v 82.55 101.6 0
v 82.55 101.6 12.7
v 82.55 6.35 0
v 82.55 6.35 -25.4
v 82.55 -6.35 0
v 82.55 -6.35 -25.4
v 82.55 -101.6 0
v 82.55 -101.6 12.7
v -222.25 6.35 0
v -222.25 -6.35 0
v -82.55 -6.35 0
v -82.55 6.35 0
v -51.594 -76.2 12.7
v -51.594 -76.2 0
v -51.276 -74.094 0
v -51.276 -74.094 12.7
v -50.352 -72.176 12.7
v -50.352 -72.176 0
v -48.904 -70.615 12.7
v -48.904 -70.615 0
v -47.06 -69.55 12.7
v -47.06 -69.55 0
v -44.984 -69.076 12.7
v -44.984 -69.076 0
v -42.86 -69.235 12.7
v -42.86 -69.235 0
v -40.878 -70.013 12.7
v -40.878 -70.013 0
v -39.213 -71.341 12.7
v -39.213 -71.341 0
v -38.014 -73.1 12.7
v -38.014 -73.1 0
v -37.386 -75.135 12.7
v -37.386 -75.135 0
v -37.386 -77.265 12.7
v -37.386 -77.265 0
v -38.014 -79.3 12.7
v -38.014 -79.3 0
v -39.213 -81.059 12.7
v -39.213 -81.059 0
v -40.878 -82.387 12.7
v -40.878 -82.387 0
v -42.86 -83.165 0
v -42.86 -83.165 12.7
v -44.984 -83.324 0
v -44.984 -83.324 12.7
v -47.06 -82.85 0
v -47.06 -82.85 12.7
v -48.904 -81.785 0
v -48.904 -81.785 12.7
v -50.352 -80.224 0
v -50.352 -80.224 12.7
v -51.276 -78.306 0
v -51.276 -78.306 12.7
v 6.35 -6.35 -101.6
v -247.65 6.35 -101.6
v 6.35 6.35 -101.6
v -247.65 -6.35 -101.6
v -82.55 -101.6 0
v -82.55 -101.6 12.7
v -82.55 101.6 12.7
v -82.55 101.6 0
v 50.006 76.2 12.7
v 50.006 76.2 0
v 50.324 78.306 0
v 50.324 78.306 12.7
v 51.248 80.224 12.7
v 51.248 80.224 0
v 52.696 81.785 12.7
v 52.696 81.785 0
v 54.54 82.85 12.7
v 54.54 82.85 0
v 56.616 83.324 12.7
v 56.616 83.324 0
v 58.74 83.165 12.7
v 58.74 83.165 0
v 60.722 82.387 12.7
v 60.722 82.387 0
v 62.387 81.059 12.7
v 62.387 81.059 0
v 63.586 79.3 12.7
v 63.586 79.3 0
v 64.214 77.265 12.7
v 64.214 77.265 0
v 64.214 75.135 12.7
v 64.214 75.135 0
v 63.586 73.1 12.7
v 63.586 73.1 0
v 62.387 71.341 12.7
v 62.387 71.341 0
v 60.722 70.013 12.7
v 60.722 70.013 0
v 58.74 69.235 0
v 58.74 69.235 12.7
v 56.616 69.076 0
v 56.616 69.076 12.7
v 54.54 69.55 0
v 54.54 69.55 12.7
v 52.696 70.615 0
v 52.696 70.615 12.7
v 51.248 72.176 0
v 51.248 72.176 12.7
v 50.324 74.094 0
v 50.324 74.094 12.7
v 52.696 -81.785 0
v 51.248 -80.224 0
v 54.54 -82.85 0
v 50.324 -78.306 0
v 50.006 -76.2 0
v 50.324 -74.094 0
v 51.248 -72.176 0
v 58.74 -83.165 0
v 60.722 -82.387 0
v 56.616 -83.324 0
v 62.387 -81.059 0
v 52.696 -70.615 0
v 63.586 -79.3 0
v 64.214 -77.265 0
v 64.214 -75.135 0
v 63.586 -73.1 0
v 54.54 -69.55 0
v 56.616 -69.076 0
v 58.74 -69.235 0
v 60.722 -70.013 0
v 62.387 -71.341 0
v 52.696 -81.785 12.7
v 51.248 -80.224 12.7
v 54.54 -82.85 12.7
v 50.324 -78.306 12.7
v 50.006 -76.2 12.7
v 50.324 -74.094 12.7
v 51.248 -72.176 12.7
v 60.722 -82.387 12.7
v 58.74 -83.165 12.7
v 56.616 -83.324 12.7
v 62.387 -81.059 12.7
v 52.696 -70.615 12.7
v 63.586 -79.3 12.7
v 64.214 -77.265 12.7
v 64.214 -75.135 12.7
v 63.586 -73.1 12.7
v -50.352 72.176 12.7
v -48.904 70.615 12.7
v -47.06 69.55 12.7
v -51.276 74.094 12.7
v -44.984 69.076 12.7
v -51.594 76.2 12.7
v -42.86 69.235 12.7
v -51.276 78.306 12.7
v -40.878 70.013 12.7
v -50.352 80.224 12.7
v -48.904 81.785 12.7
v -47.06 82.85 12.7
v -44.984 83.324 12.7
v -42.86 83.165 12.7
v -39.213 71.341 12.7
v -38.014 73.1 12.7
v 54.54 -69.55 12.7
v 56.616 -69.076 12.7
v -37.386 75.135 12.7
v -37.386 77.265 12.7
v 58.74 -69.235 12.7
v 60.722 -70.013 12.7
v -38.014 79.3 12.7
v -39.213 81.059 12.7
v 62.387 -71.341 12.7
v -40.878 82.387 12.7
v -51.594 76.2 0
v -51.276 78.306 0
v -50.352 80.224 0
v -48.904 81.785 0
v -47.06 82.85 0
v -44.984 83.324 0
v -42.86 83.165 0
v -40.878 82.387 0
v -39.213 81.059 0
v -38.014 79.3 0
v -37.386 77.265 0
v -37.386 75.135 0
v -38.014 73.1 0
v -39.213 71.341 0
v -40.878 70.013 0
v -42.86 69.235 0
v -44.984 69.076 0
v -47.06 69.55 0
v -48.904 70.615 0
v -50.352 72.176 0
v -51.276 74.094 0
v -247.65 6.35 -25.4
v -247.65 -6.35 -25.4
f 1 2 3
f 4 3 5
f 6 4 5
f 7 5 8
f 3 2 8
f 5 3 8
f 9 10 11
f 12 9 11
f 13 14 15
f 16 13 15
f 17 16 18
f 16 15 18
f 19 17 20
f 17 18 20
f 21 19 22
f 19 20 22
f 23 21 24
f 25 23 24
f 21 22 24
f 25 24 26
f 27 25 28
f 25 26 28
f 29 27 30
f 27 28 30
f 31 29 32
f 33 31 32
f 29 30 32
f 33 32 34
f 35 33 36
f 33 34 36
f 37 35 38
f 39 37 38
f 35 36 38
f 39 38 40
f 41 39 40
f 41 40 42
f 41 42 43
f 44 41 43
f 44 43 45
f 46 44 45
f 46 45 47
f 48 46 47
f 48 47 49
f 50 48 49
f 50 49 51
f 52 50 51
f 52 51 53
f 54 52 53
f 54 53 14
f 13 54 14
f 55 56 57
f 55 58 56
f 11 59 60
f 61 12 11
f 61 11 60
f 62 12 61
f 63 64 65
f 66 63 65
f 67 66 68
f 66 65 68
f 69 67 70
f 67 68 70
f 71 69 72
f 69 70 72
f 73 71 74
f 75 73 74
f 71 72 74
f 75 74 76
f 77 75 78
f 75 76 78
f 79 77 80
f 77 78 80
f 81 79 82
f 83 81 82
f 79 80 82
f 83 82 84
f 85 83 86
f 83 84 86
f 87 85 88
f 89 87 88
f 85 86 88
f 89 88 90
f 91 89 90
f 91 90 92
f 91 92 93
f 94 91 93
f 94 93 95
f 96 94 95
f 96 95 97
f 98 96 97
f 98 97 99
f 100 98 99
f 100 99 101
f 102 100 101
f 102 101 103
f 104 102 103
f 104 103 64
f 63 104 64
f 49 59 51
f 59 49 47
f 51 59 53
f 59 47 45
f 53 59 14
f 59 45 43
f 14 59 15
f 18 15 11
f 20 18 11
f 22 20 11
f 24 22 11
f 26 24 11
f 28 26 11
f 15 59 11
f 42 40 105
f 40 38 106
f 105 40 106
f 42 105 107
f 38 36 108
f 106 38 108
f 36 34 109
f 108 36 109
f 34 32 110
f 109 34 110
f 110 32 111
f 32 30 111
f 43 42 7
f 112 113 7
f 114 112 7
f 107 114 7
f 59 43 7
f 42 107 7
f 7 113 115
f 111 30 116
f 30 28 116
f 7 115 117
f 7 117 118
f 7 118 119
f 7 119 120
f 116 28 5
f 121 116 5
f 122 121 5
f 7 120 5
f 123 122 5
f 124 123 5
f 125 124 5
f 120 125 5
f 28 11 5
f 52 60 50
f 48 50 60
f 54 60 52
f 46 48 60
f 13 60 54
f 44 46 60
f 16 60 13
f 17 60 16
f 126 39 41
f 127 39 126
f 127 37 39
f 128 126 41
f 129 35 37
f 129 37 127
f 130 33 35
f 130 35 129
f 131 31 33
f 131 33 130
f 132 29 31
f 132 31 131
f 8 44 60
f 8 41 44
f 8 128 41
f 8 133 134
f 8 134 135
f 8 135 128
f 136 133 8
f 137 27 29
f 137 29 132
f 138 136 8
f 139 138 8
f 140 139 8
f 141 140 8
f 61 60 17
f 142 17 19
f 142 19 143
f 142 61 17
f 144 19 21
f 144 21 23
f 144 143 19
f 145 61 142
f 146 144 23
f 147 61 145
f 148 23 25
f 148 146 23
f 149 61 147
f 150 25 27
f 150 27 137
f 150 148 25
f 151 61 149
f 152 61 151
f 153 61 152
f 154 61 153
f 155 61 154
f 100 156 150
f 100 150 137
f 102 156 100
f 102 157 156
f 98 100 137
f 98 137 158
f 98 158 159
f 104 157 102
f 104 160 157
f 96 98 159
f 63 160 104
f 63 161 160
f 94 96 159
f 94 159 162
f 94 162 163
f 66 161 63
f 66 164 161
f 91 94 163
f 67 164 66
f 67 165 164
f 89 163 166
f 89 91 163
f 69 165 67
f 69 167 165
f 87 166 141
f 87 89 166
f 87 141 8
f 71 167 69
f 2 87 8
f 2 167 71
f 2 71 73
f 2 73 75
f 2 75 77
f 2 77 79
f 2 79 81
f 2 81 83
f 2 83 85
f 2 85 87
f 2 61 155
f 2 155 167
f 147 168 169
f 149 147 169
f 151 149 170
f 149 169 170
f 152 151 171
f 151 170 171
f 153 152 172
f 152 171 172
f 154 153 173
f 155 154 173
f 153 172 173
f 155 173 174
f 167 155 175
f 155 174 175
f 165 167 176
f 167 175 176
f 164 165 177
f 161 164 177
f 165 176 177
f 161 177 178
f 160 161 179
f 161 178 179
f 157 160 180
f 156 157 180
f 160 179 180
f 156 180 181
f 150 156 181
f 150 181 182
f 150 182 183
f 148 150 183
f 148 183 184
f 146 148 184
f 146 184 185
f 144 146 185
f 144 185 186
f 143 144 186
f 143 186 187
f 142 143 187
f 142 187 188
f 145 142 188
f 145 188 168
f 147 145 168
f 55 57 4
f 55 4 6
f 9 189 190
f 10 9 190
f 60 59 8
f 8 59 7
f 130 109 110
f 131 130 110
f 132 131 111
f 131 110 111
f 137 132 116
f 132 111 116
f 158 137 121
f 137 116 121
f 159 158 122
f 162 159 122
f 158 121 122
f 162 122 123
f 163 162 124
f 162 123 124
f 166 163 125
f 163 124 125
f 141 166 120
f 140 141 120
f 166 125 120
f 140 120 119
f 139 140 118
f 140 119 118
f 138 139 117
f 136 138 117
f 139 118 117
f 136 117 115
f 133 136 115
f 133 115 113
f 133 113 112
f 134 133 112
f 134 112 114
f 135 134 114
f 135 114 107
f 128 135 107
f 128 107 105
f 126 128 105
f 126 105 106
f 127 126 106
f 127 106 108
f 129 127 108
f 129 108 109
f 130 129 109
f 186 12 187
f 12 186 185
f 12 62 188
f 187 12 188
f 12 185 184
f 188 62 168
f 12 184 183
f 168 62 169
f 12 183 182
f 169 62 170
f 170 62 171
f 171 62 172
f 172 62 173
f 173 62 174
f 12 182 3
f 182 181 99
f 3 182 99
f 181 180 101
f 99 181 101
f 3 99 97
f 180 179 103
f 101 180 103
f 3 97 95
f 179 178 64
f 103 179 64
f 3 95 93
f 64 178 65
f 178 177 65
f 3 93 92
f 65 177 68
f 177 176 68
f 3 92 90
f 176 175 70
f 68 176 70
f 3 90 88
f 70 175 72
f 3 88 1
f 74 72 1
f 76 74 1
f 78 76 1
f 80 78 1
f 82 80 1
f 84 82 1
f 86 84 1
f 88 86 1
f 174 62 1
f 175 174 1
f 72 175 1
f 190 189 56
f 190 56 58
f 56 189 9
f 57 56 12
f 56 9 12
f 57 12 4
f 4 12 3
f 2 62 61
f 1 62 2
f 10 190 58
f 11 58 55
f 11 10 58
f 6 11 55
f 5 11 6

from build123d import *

# Parameters (mm, degrees)
F0_W     = 165.1
F0_H     = 203.2
F1_DEPTH = 12.7
F3_D     = 14.2875
F3_DEPTH = 50.8
F3_TIP   = 4.2923980472
F4_W     = 330.2
F4_H     = 12.7
F5_DEPTH = 101.6
F6_SIZE  = 76.2
F7_SIZE  = 25.4


# Not quite as in the source:
# - a length typed as a fraction of an inch, garbled in the dataset ("3 / 203.2 mm" for 3/8 in), is restored


with BuildPart() as f1:
    # F0 (on Top) → F1 (new body)
    with BuildSketch(Plane.XY):
        Rectangle(F0_W, F0_H)
    extrude(amount=F1_DEPTH)

    # F3
    with Locations(Plane.XY.offset(12.7)):
        with Locations((-44.45, 76.2), (57.15, 76.2), (-44.45, -76.2), (57.15, -76.2)):
            Hole(F3_D / 2, depth=F3_DEPTH)
            with Locations((0, 0, -(F3_DEPTH + F3_TIP / 2))):  # 118° drill point
                Cone(0, F3_D / 2, F3_TIP, mode=Mode.SUBTRACT)

    # F4 (on face) → F5 (join)
    with BuildSketch(Plane(origin=(0, 0, 0), x_dir=(1, 0, 0), z_dir=(0, 0, -1))):
        with Locations((-82.55, 0)):
            Rectangle(F4_W, F4_H)
    extrude(amount=F5_DEPTH)

    # F6
    f6_edges = [f1.edges().sort_by_distance(p)[0] for p in [
        (82.55, 0, -101.6),
    ]]
    chamfer(f6_edges, length=F6_SIZE)

    # F7
    f7_edges = [f1.edges().sort_by_distance(p)[0] for p in [
        (-247.65, 0, 0),
    ]]
    chamfer(f7_edges, length=F7_SIZE)


solid = f1.part
